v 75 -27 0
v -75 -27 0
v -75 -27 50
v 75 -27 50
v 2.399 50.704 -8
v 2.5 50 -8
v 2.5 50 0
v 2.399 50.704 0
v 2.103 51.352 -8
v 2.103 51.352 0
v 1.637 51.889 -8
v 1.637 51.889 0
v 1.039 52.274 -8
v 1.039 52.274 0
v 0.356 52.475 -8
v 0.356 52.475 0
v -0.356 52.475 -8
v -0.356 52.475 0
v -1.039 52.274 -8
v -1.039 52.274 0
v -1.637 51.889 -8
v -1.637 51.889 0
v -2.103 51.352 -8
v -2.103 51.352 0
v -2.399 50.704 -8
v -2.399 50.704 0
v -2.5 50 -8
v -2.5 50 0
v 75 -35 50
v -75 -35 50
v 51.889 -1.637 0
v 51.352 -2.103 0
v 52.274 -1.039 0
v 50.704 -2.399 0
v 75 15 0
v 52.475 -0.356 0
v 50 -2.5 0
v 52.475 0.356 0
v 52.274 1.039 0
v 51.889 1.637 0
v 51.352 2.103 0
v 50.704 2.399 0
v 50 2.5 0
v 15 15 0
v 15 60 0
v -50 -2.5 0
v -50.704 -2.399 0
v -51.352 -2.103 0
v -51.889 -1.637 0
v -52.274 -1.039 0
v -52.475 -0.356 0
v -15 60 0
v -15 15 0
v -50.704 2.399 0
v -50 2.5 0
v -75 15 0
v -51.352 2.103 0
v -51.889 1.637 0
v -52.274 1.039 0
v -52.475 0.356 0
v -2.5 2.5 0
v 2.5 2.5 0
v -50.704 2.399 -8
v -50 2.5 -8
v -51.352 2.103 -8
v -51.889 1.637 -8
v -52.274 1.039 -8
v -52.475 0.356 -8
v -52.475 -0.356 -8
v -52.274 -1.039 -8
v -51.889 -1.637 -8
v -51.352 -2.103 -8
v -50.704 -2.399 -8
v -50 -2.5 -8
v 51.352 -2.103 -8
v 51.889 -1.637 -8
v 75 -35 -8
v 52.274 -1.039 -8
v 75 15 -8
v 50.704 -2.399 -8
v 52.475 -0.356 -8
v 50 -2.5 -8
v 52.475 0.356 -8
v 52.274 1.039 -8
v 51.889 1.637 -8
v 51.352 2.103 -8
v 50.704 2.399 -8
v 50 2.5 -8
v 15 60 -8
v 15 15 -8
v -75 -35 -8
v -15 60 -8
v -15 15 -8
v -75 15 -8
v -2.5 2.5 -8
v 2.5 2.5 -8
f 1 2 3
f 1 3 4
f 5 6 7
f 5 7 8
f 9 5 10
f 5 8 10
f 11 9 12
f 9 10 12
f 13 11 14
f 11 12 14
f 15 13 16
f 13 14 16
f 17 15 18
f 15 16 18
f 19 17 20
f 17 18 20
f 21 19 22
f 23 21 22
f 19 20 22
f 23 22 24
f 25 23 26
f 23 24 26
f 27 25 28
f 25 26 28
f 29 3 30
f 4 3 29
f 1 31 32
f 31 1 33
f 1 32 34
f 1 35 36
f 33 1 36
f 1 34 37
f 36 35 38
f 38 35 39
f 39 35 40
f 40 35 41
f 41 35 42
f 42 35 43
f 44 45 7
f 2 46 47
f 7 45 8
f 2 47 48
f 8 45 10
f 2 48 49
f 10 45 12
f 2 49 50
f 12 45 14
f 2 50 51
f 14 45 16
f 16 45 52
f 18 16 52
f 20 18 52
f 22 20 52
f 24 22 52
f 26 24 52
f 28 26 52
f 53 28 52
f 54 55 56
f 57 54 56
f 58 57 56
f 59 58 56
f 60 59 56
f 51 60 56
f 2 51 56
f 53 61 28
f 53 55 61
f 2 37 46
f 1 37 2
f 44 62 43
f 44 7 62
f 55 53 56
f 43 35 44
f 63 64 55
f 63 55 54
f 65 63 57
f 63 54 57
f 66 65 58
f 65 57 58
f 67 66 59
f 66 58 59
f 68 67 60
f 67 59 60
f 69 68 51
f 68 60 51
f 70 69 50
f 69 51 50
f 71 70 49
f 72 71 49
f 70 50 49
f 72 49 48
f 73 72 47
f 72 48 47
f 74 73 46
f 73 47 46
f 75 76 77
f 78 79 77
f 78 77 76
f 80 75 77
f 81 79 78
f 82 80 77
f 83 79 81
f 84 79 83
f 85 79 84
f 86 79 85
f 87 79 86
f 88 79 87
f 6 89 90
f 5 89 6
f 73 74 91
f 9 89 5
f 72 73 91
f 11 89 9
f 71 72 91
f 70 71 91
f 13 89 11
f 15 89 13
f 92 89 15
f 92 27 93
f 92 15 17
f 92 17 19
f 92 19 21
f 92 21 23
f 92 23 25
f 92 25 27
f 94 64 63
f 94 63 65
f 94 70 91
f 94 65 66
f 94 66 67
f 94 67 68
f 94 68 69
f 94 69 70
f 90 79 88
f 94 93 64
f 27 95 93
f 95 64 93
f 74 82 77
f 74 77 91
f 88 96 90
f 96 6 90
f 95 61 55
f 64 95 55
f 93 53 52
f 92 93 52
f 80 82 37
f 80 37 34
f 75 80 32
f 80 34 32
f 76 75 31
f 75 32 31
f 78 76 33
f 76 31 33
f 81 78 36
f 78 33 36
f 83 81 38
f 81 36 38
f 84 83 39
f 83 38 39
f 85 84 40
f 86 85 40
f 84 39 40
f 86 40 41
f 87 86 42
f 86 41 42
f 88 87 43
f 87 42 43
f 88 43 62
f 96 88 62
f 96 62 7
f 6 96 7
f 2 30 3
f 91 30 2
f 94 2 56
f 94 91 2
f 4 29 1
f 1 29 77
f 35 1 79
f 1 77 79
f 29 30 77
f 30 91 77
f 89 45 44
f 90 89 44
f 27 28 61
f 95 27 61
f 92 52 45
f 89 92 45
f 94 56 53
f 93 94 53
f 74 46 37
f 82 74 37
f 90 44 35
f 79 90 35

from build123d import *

# Parameters (mm, degrees)
BOSS_EXTRUDE1_DEPTH = 8
SKETCH2_W           = 150
SKETCH2_H           = 8
BOSS_EXTRUDE2_DEPTH = 50


with BuildPart() as part:
    # Sketch1 → Boss-Extrude1 (new body)
    with BuildSketch(Plane.XY):
        Polygon((-15, 15), (-15, 60), (15, 60), (15, 15), (75, 15), (75, -35), (-75, -35), (-75, 15), align=None)
        with BuildLine():
            Line((-2.5, 2.5), (-50, 2.5))
            ThreePointArc((-50, 2.5), (-52.5, 0), (-50, -2.5))
            Line((-50, -2.5), (50, -2.5))
            ThreePointArc((50, -2.5), (52.5, 0), (50, 2.5))
            Line((50, 2.5), (2.5, 2.5))
            Line((2.5, 2.5), (2.5, 50))
            ThreePointArc((2.5, 50), (0, 52.5), (-2.5, 50))
            Line((-2.5, 50), (-2.5, 2.5))
        make_face(mode=Mode.SUBTRACT)
    extrude(amount=-BOSS_EXTRUDE1_DEPTH)

    # Sketch2 → Boss-Extrude2 (add)
    with BuildSketch(Plane.XY):
        with Locations((0, -31)):
            Rectangle(SKETCH2_W, SKETCH2_H)
    extrude(amount=BOSS_EXTRUDE2_DEPTH)


solid = part.part
